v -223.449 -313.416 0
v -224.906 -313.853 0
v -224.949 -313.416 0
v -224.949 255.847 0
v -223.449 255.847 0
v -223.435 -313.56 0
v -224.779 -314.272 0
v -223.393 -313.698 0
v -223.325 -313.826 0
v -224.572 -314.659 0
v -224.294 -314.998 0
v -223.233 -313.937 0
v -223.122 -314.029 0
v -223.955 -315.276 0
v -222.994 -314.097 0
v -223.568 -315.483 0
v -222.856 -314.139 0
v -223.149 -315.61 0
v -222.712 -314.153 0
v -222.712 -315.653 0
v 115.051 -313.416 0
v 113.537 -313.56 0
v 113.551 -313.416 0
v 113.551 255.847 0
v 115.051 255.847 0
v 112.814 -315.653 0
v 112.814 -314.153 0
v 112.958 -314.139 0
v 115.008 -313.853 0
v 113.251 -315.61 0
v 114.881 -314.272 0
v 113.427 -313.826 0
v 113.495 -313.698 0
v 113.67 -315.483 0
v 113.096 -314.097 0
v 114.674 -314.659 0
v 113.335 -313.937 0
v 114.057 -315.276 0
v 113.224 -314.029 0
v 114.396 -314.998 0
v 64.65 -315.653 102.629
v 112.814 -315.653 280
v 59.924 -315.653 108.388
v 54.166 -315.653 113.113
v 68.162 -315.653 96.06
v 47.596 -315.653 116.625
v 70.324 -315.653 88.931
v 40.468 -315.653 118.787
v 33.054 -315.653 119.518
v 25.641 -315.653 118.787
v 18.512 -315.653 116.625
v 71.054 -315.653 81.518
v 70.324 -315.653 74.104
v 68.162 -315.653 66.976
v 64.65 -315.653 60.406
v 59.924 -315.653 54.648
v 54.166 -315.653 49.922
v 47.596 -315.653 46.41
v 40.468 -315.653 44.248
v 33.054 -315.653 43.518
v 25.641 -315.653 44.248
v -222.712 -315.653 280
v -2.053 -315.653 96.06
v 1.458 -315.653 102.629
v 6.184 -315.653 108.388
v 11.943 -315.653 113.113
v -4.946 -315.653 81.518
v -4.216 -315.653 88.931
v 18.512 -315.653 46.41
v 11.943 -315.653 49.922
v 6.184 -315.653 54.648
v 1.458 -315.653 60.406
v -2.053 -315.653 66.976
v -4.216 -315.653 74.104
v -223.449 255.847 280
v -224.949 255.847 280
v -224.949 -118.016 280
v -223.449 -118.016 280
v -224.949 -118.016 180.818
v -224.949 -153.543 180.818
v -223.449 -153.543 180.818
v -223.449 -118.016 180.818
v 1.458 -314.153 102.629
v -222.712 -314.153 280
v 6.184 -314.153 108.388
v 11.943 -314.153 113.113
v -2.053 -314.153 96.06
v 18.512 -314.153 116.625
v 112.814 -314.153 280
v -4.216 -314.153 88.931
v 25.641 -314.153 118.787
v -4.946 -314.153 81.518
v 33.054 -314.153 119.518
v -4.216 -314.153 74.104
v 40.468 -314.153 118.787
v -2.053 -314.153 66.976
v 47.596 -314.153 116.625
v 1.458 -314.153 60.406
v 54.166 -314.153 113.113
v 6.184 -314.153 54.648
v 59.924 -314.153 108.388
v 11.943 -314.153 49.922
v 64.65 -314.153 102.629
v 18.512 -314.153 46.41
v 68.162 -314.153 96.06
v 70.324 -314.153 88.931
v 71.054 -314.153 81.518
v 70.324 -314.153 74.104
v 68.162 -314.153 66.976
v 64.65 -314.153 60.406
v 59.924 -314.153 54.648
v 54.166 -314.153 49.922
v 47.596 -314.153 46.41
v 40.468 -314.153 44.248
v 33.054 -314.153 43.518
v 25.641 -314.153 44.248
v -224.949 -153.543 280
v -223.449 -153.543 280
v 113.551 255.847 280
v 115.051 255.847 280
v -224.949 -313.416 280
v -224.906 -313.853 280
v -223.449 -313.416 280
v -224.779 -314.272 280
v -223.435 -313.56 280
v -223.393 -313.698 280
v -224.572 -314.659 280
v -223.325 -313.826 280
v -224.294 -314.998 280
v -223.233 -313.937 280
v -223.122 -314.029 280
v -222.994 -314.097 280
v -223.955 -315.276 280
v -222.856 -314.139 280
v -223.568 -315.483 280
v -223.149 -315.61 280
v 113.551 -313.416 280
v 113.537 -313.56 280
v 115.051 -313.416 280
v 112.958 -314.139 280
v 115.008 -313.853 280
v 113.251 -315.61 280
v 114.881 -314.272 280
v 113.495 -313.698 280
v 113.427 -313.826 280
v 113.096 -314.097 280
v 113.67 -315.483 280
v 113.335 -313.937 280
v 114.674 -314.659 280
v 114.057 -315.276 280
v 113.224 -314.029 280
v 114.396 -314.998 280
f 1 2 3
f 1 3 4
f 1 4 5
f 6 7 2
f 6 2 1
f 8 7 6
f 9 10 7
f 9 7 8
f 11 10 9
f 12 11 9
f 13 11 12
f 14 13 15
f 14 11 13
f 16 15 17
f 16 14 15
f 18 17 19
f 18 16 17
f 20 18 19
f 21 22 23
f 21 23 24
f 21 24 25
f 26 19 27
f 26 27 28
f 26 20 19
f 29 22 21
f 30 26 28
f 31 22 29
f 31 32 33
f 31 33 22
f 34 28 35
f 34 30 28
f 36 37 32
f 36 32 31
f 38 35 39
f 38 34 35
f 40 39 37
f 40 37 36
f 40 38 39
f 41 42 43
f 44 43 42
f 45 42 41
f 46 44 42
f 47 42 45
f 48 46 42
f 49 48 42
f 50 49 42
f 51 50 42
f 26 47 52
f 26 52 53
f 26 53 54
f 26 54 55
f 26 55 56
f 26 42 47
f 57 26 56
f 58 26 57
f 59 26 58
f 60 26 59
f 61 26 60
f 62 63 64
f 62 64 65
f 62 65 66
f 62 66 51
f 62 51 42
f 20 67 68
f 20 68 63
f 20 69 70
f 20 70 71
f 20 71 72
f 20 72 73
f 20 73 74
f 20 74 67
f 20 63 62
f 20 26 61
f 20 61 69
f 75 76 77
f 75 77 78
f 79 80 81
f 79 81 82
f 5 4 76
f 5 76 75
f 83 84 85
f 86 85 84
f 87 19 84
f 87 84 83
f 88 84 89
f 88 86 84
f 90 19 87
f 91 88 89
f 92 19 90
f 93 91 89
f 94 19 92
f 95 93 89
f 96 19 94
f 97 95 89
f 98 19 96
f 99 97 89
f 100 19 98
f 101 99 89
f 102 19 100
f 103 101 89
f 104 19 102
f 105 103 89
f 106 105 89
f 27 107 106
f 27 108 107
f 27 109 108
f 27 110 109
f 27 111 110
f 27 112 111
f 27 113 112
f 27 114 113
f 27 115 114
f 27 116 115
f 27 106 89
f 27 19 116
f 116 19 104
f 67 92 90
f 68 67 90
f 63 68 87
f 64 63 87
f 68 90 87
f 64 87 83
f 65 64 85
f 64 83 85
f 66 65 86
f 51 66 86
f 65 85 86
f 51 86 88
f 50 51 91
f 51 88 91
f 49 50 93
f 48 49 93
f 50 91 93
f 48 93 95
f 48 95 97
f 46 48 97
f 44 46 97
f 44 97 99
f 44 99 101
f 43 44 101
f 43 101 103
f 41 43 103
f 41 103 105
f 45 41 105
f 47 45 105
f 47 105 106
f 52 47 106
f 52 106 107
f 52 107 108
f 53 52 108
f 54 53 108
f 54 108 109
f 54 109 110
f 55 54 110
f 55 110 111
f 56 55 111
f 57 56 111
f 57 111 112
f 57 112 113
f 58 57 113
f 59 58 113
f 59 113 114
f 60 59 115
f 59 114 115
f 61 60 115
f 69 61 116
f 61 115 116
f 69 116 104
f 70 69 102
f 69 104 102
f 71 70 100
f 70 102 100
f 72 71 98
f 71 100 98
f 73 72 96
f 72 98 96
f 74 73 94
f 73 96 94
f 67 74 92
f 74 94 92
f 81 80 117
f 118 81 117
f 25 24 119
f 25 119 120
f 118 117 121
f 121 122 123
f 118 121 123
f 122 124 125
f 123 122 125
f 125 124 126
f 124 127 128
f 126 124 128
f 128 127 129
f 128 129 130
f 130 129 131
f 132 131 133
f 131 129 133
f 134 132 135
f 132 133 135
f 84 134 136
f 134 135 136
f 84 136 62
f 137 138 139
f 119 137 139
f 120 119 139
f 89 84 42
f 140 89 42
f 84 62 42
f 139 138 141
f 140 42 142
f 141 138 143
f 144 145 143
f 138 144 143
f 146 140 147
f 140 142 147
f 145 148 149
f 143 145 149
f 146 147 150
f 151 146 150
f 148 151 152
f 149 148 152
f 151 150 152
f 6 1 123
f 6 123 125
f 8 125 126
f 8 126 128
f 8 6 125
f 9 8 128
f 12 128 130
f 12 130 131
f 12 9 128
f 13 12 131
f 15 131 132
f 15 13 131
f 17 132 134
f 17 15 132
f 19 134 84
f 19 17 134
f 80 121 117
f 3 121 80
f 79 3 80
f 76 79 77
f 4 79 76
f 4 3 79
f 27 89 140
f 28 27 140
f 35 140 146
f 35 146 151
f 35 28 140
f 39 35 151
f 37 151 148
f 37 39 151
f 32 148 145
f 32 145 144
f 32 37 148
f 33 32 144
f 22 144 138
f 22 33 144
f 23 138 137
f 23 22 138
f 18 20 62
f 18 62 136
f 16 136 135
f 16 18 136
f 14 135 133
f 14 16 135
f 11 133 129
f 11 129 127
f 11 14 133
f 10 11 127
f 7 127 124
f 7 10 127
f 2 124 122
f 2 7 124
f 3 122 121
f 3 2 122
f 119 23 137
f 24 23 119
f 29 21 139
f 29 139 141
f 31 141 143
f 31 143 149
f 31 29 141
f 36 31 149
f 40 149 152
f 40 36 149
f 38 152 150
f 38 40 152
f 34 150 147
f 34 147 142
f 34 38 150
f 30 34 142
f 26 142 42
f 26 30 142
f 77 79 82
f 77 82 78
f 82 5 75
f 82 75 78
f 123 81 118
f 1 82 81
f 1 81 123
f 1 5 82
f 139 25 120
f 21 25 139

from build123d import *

# Parameters (mm, degrees)
BASE_FLANGE1_DEPTH = 280
SKETCH2_W          = 105.722877612
SKETCH2_H          = 35.527417617
CUT_EXTRUDE1_DEPTH = 10
SKETCH3_R          = 38
CUT_EXTRUDE2_DEPTH = 500


# Sheet-metal steps are written as plain solids
with BuildPart() as part:
    # Sketch1 → Base-Flange1 (new body)
    with BuildSketch(Plane(origin=(0, 0, 0), x_dir=(-1, 0, 0), z_dir=(0, 0, 1))):
        with BuildLine():
            Line((223.448991217, -255.847131966), (223.448991217, 313.416268034))
            ThreePointArc((223.448991217, 313.416268034), (223.233246072, 313.937122889), (222.712391217, 314.152868034))
            Line((222.712391217, 314.152868034), (-112.814408783, 314.152868034))
            ThreePointArc((-112.814408783, 314.152868034), (-113.335263638, 313.937122889), (-113.551008783, 313.416268034))
            Line((-113.551008783, 313.416268034), (-113.551008783, -255.847131966))
            Line((-113.551008783, -255.847131966), (-115.051008783, -255.847131966))
            Line((-115.051008783, -255.847131966), (-115.051008783, 313.416268034))
            ThreePointArc((-115.051008783, 313.416268034), (-114.39592381, 314.997783061), (-112.814408783, 315.652868034))
            Line((-112.814408783, 315.652868034), (222.712391217, 315.652868034))
            ThreePointArc((222.712391217, 315.652868034), (224.293906243, 314.997783061), (224.948991217, 313.416268034))
            Line((224.948991217, 313.416268034), (224.948991217, -255.847131966))
            Line((224.948991217, -255.847131966), (223.448991217, -255.847131966))
        make_face()
    extrude(amount=BASE_FLANGE1_DEPTH)

    # Sketch2 → Cut-Extrude1 (cut)
    with BuildSketch(Plane.ZY.offset(224.948991217)):
        with Locations((233.67908011, -135.779600883)):
            Rectangle(SKETCH2_W, SKETCH2_H)
    extrude(amount=-CUT_EXTRUDE1_DEPTH, mode=Mode.SUBTRACT)

    # Sketch3 → Cut-Extrude2 (cut)
    with BuildSketch(Plane(origin=(0, -314.152868034, 0), x_dir=(1, 0, 0), z_dir=(0, 1, 0))):
        with Locations(Location((33.054236524, -81.51765287, 0), (0, 0, 180))):
            Circle(SKETCH3_R)
    extrude(amount=-CUT_EXTRUDE2_DEPTH, mode=Mode.SUBTRACT)


solid = part.part
